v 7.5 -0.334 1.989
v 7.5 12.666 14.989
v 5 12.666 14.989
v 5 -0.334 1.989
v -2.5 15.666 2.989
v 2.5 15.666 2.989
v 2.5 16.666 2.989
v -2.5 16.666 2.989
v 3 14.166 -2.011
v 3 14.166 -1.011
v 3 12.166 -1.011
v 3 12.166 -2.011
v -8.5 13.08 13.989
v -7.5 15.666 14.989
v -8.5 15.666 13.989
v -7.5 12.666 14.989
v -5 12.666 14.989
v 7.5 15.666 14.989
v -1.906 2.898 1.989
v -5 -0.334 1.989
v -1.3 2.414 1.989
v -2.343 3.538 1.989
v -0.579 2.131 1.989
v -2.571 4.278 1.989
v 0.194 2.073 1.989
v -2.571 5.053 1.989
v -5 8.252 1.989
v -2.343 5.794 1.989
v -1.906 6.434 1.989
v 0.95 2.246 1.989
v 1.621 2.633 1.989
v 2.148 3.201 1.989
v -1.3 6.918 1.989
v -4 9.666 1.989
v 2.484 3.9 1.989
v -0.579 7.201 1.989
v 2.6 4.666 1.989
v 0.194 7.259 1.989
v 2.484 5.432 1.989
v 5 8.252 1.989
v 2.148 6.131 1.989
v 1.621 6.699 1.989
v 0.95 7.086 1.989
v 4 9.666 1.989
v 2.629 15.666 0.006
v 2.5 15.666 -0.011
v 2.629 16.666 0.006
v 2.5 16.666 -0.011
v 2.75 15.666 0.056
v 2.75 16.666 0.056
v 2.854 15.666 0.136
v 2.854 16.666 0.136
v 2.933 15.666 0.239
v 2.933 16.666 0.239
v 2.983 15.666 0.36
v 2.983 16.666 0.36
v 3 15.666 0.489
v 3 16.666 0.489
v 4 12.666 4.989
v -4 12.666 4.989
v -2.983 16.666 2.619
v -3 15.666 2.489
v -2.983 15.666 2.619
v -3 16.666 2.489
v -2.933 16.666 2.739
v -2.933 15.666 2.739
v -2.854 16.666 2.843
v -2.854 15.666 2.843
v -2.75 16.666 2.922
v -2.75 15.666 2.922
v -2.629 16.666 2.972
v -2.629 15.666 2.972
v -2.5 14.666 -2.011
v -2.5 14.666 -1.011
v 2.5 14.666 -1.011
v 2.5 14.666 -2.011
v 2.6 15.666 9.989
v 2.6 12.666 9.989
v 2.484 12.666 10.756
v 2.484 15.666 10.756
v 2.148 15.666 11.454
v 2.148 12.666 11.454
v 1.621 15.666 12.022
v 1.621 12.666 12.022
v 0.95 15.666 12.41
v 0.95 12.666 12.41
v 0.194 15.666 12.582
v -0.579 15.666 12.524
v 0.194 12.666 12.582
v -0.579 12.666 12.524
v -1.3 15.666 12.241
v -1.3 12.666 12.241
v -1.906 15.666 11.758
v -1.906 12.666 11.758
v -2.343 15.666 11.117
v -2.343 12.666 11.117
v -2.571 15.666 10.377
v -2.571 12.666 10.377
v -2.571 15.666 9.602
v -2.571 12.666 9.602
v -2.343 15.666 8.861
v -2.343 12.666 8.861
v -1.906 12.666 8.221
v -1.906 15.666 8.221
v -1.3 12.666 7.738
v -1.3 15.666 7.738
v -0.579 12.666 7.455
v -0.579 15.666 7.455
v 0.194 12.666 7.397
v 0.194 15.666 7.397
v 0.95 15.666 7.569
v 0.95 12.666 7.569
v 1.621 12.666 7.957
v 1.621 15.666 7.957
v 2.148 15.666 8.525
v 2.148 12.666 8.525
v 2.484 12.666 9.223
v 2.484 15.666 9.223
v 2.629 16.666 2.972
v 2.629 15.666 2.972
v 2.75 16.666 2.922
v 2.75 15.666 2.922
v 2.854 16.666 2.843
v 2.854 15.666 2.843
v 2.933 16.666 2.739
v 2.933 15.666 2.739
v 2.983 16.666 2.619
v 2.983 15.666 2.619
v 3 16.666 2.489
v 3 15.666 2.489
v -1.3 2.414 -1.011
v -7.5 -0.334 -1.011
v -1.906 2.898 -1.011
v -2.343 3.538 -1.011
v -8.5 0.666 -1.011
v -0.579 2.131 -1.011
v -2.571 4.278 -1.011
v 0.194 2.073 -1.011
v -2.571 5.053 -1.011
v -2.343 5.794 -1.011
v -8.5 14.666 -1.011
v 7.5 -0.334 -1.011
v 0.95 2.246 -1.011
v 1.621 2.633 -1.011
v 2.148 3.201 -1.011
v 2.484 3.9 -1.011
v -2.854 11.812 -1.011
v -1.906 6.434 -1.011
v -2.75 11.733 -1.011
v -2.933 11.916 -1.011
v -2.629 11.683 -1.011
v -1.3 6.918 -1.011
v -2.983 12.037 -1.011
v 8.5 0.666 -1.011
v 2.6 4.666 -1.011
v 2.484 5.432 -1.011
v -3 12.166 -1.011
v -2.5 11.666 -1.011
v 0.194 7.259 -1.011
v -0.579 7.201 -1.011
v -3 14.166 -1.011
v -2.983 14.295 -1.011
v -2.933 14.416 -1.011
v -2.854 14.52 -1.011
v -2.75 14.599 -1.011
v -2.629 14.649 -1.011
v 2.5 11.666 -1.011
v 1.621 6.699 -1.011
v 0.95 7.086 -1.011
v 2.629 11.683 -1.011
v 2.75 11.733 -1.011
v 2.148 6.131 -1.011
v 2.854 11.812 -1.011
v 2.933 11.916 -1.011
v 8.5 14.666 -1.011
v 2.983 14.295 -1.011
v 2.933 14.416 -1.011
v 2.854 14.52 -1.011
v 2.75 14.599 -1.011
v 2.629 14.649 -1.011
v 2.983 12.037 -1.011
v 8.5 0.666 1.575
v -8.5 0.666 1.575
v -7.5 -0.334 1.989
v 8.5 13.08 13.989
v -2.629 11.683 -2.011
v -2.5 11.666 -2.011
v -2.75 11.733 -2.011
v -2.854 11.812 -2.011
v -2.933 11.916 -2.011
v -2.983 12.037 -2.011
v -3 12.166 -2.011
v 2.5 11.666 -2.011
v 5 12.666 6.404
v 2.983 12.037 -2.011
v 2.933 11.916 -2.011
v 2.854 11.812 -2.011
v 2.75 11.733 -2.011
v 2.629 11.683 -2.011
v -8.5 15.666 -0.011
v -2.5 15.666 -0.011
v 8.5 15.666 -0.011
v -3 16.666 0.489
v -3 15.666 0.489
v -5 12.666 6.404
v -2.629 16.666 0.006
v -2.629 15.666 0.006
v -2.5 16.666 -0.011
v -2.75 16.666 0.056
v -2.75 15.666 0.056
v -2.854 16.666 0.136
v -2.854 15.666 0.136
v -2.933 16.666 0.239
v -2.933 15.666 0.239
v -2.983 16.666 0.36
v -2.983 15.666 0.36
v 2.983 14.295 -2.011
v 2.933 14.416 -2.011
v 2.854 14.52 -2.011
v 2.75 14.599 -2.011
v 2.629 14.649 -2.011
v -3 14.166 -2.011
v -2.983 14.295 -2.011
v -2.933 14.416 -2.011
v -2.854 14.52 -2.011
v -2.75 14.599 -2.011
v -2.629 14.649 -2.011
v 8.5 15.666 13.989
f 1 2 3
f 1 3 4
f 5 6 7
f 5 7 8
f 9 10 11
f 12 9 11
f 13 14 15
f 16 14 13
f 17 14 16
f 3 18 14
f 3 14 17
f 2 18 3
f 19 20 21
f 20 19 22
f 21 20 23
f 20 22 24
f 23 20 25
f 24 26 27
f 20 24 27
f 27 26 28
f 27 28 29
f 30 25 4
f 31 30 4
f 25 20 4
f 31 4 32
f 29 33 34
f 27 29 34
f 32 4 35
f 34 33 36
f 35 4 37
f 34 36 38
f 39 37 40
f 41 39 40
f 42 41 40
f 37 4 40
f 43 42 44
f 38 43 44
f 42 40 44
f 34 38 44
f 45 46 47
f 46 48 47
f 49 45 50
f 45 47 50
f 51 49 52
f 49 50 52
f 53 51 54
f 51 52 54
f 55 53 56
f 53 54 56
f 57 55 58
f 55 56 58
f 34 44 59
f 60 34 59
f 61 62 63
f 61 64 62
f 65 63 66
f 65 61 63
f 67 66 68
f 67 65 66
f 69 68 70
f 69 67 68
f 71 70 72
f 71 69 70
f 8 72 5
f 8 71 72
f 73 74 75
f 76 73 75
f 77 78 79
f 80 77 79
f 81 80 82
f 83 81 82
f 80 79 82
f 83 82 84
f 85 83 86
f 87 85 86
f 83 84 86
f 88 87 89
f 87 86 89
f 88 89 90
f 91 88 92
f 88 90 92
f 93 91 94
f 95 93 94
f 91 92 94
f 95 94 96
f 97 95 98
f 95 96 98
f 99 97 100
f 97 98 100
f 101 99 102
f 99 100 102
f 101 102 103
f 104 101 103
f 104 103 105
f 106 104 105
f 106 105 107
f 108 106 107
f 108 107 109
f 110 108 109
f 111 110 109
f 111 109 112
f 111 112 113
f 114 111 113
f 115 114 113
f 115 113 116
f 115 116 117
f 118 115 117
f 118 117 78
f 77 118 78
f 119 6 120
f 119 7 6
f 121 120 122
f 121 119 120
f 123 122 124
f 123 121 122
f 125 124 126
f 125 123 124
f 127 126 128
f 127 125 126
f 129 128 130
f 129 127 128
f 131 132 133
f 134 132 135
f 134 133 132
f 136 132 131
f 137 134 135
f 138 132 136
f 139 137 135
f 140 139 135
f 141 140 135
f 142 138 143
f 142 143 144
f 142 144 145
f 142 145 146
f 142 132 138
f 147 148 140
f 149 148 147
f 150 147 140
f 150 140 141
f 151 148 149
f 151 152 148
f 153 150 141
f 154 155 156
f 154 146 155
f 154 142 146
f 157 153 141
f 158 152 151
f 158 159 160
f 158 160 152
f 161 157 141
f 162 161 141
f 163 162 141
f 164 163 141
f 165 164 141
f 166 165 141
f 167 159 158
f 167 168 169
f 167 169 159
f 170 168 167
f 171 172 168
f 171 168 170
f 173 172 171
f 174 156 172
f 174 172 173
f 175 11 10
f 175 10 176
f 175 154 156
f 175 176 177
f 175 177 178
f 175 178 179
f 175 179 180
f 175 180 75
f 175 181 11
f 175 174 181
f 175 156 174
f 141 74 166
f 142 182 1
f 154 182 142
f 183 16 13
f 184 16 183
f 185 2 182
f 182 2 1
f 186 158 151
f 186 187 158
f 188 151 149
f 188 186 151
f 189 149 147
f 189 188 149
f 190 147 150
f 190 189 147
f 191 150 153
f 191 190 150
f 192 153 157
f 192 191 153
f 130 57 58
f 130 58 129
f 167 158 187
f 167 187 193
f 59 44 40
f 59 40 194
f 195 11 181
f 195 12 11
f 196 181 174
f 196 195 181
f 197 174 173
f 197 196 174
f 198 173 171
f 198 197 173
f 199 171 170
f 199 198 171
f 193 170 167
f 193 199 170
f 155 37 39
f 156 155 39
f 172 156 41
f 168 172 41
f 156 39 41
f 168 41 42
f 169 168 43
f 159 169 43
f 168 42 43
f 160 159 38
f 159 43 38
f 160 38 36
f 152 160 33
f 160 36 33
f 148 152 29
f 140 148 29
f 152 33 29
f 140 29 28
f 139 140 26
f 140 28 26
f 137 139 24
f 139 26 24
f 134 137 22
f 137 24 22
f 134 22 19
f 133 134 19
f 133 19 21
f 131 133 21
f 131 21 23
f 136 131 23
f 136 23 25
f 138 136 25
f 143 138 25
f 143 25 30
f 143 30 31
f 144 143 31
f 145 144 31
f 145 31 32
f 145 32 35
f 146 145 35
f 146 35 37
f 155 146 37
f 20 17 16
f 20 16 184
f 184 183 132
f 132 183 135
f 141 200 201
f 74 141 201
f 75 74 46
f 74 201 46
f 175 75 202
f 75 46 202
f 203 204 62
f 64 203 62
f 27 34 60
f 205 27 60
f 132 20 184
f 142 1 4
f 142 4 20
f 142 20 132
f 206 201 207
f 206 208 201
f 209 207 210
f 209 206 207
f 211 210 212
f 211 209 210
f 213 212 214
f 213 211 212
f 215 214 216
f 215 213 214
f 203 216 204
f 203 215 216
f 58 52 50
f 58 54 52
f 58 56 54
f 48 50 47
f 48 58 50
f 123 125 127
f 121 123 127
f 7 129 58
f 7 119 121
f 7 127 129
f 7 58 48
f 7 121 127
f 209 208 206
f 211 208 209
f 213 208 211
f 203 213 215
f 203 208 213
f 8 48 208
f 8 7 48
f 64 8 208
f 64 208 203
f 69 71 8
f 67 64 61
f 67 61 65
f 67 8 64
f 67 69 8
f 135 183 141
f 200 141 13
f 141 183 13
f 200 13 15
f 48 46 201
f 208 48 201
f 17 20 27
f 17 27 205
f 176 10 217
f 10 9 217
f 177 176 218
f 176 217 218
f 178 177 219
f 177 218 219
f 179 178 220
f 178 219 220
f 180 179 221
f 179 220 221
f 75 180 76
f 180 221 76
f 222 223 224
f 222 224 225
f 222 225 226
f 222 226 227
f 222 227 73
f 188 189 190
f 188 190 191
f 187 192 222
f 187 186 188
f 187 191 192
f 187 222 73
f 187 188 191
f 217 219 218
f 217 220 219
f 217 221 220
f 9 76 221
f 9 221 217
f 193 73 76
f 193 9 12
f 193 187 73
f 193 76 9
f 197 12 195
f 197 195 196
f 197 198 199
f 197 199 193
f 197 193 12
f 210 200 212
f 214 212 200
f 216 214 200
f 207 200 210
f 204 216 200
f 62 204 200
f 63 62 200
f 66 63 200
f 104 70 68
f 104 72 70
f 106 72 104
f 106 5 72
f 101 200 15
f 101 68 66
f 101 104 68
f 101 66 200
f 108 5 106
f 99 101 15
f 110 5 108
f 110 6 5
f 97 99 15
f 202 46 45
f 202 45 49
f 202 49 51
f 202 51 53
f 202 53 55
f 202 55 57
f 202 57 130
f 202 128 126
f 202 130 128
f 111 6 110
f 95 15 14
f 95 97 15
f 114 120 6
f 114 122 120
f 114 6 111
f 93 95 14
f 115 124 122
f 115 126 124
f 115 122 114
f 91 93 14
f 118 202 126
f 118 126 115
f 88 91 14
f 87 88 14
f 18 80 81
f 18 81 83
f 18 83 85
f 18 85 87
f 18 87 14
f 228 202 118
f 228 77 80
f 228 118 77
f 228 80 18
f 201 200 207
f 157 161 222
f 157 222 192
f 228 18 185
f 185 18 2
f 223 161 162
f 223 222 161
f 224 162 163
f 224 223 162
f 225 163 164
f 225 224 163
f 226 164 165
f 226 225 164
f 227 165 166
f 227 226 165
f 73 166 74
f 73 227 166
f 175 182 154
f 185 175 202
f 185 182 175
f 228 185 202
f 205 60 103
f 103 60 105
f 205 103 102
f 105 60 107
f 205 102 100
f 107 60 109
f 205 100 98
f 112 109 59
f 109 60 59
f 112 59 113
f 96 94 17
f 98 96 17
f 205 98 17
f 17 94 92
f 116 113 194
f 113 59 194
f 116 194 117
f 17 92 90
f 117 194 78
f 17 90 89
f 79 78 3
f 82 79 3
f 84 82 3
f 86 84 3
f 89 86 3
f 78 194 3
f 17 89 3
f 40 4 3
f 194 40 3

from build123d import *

# Parameters (mm, degrees)
F1_DEPTH  = 8.5
F2_DEPTH  = 5
F3_R      = 2.6
F4_DEPTH  = 25
F5_R      = 2.6
F6_DEPTH  = 25
F7_SIZE   = 1
F8_W      = 6
F8_H      = 3
F9_DEPTH  = 1
F10_W     = 6
F10_H     = 3
F11_DEPTH = 1
F12_R     = 0.5


with BuildPart() as f1:
    # F0 (on Right) → F1 (new body, symmetric)
    with BuildSketch(Plane.YZ):
        Polygon((-0.3340116796, 1.9893845548), (-0.3340116796, -1.0106154452), (15.6659883204, -1.0106154452), (15.6659883204, 14.9893845548), (12.6659883204, 14.9893845548), (12.6659883204, 4.9893845548), (9.6659883204, 1.9893845548), align=None)
        Polygon((12.6659883204, 14.9893845548), (-0.3340116796, 1.9893845548), (9.6659883204, 1.9893845548), (12.6659883204, 4.9893845548), align=None)
    extrude(amount=F1_DEPTH, both=True)

    # F0 (on Right) → F2 (cut, symmetric)
    with BuildSketch(Plane.YZ):
        Polygon((12.6659883204, 14.9893845548), (-0.3340116796, 1.9893845548), (9.6659883204, 1.9893845548), (12.6659883204, 4.9893845548), align=None)
    extrude(amount=F2_DEPTH, both=True, mode=Mode.SUBTRACT)

    # F3 (on face) → F4 (cut)
    with BuildSketch(Plane.XZ.offset(-12.6659883204)):
        with Locations((0, 9.9893845548)):
            Circle(F3_R)
    extrude(amount=-F4_DEPTH, mode=Mode.SUBTRACT)

    # F5 (on face) → F6 (cut)
    with BuildSketch(Plane.XY.offset(1.9893845548)):
        with Locations((0, 4.6659883204)):
            Circle(F5_R)
    extrude(amount=-F6_DEPTH, mode=Mode.SUBTRACT)

    # F7
    f7_edges = [f1.edges().sort_by_distance(p)[0] for p in [
        (-8.5, 14.165988, 14.989385),
        (-8.5, 6.165988, 8.489385),
        (-8.5, -0.334012, 0.489385),
        (8.5, -0.334012, 0.489385),
        (8.5, 6.165988, 8.489385),
        (8.5, 14.165988, 14.989385),
        (-5, 11.165988, 3.489385),
        (5, 11.165988, 3.489385),
        (0, 15.665988, -1.010615),
    ]]
    chamfer(f7_edges, length=F7_SIZE)

    # F8 (on face) → F9 (join)
    with BuildSketch(Plane(origin=(0, 15.6659883204, 0), x_dir=(-1, 0, 0), z_dir=(0, 1, 0))):
        with Locations((0, 1.4893845548)):
            Rectangle(F8_W, F8_H)
    extrude(amount=F9_DEPTH)

    # F10 (on face) → F11 (join)
    with BuildSketch(Plane(origin=(0, 0, -1.0106154452), x_dir=(1, 0, 0), z_dir=(0, 0, -1))):
        with Locations((0, -13.1659883204)):
            Rectangle(F10_W, F10_H)
    extrude(amount=F11_DEPTH)

    # F12
    f12_edges = [f1.edges().sort_by_distance(p)[0] for p in [
        (3, 16.165988, 2.989385),
        (3, 16.165988, -0.010615),
        (-3, 16.165988, 2.989385),
        (-3, 16.165988, -0.010615),
        (-3, 11.665988, -1.510615),
        (-3, 14.665988, -1.510615),
        (3, 11.665988, -1.510615),
        (3, 14.665988, -1.510615),
    ]]
    fillet(f12_edges, radius=F12_R)


solid = f1.part
